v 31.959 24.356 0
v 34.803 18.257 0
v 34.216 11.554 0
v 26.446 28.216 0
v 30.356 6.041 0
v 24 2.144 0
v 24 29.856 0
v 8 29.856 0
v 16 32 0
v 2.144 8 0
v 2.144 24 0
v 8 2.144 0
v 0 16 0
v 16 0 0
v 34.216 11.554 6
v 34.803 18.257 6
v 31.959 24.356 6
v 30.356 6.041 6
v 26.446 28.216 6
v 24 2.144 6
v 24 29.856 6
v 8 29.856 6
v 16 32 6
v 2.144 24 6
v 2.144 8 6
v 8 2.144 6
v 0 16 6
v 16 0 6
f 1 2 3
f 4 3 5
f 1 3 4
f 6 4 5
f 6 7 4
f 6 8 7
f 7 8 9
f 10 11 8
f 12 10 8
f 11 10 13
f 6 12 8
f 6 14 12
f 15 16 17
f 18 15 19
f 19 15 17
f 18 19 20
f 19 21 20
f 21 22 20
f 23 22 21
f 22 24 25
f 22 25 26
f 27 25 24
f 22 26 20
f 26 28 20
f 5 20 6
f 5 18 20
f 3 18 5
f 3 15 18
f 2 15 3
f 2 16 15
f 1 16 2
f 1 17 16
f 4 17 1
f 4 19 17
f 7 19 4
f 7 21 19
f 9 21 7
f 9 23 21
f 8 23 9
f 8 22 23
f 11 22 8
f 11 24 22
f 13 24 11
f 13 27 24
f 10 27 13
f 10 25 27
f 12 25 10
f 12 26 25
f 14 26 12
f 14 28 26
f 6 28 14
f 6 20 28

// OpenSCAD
$fn = 32;

// ----------------------------------------------------------------------
// Eccentric disc: egg, 6 mm thick
// ----------------------------------------------------------------------

// --- parameters (mm) ---
profile_height = 6;       // extrusion height
profile_points = 14;      // points of the closed outline

profile = [[0, 16], [2.144, 8], [8, 2.144], [16, 0], [24, 2.144], [30.356, 6.041], [34.216, 11.554], [34.803, 18.257], [31.959, 24.356], [26.446, 28.216], [24, 29.856], [16, 32], [8, 29.856], [2.144, 24]];  // single closed polygon, 14 points, counter clockwise

// --- the one profile operation ---
linear_extrude(height = profile_height) polygon(points = profile);
